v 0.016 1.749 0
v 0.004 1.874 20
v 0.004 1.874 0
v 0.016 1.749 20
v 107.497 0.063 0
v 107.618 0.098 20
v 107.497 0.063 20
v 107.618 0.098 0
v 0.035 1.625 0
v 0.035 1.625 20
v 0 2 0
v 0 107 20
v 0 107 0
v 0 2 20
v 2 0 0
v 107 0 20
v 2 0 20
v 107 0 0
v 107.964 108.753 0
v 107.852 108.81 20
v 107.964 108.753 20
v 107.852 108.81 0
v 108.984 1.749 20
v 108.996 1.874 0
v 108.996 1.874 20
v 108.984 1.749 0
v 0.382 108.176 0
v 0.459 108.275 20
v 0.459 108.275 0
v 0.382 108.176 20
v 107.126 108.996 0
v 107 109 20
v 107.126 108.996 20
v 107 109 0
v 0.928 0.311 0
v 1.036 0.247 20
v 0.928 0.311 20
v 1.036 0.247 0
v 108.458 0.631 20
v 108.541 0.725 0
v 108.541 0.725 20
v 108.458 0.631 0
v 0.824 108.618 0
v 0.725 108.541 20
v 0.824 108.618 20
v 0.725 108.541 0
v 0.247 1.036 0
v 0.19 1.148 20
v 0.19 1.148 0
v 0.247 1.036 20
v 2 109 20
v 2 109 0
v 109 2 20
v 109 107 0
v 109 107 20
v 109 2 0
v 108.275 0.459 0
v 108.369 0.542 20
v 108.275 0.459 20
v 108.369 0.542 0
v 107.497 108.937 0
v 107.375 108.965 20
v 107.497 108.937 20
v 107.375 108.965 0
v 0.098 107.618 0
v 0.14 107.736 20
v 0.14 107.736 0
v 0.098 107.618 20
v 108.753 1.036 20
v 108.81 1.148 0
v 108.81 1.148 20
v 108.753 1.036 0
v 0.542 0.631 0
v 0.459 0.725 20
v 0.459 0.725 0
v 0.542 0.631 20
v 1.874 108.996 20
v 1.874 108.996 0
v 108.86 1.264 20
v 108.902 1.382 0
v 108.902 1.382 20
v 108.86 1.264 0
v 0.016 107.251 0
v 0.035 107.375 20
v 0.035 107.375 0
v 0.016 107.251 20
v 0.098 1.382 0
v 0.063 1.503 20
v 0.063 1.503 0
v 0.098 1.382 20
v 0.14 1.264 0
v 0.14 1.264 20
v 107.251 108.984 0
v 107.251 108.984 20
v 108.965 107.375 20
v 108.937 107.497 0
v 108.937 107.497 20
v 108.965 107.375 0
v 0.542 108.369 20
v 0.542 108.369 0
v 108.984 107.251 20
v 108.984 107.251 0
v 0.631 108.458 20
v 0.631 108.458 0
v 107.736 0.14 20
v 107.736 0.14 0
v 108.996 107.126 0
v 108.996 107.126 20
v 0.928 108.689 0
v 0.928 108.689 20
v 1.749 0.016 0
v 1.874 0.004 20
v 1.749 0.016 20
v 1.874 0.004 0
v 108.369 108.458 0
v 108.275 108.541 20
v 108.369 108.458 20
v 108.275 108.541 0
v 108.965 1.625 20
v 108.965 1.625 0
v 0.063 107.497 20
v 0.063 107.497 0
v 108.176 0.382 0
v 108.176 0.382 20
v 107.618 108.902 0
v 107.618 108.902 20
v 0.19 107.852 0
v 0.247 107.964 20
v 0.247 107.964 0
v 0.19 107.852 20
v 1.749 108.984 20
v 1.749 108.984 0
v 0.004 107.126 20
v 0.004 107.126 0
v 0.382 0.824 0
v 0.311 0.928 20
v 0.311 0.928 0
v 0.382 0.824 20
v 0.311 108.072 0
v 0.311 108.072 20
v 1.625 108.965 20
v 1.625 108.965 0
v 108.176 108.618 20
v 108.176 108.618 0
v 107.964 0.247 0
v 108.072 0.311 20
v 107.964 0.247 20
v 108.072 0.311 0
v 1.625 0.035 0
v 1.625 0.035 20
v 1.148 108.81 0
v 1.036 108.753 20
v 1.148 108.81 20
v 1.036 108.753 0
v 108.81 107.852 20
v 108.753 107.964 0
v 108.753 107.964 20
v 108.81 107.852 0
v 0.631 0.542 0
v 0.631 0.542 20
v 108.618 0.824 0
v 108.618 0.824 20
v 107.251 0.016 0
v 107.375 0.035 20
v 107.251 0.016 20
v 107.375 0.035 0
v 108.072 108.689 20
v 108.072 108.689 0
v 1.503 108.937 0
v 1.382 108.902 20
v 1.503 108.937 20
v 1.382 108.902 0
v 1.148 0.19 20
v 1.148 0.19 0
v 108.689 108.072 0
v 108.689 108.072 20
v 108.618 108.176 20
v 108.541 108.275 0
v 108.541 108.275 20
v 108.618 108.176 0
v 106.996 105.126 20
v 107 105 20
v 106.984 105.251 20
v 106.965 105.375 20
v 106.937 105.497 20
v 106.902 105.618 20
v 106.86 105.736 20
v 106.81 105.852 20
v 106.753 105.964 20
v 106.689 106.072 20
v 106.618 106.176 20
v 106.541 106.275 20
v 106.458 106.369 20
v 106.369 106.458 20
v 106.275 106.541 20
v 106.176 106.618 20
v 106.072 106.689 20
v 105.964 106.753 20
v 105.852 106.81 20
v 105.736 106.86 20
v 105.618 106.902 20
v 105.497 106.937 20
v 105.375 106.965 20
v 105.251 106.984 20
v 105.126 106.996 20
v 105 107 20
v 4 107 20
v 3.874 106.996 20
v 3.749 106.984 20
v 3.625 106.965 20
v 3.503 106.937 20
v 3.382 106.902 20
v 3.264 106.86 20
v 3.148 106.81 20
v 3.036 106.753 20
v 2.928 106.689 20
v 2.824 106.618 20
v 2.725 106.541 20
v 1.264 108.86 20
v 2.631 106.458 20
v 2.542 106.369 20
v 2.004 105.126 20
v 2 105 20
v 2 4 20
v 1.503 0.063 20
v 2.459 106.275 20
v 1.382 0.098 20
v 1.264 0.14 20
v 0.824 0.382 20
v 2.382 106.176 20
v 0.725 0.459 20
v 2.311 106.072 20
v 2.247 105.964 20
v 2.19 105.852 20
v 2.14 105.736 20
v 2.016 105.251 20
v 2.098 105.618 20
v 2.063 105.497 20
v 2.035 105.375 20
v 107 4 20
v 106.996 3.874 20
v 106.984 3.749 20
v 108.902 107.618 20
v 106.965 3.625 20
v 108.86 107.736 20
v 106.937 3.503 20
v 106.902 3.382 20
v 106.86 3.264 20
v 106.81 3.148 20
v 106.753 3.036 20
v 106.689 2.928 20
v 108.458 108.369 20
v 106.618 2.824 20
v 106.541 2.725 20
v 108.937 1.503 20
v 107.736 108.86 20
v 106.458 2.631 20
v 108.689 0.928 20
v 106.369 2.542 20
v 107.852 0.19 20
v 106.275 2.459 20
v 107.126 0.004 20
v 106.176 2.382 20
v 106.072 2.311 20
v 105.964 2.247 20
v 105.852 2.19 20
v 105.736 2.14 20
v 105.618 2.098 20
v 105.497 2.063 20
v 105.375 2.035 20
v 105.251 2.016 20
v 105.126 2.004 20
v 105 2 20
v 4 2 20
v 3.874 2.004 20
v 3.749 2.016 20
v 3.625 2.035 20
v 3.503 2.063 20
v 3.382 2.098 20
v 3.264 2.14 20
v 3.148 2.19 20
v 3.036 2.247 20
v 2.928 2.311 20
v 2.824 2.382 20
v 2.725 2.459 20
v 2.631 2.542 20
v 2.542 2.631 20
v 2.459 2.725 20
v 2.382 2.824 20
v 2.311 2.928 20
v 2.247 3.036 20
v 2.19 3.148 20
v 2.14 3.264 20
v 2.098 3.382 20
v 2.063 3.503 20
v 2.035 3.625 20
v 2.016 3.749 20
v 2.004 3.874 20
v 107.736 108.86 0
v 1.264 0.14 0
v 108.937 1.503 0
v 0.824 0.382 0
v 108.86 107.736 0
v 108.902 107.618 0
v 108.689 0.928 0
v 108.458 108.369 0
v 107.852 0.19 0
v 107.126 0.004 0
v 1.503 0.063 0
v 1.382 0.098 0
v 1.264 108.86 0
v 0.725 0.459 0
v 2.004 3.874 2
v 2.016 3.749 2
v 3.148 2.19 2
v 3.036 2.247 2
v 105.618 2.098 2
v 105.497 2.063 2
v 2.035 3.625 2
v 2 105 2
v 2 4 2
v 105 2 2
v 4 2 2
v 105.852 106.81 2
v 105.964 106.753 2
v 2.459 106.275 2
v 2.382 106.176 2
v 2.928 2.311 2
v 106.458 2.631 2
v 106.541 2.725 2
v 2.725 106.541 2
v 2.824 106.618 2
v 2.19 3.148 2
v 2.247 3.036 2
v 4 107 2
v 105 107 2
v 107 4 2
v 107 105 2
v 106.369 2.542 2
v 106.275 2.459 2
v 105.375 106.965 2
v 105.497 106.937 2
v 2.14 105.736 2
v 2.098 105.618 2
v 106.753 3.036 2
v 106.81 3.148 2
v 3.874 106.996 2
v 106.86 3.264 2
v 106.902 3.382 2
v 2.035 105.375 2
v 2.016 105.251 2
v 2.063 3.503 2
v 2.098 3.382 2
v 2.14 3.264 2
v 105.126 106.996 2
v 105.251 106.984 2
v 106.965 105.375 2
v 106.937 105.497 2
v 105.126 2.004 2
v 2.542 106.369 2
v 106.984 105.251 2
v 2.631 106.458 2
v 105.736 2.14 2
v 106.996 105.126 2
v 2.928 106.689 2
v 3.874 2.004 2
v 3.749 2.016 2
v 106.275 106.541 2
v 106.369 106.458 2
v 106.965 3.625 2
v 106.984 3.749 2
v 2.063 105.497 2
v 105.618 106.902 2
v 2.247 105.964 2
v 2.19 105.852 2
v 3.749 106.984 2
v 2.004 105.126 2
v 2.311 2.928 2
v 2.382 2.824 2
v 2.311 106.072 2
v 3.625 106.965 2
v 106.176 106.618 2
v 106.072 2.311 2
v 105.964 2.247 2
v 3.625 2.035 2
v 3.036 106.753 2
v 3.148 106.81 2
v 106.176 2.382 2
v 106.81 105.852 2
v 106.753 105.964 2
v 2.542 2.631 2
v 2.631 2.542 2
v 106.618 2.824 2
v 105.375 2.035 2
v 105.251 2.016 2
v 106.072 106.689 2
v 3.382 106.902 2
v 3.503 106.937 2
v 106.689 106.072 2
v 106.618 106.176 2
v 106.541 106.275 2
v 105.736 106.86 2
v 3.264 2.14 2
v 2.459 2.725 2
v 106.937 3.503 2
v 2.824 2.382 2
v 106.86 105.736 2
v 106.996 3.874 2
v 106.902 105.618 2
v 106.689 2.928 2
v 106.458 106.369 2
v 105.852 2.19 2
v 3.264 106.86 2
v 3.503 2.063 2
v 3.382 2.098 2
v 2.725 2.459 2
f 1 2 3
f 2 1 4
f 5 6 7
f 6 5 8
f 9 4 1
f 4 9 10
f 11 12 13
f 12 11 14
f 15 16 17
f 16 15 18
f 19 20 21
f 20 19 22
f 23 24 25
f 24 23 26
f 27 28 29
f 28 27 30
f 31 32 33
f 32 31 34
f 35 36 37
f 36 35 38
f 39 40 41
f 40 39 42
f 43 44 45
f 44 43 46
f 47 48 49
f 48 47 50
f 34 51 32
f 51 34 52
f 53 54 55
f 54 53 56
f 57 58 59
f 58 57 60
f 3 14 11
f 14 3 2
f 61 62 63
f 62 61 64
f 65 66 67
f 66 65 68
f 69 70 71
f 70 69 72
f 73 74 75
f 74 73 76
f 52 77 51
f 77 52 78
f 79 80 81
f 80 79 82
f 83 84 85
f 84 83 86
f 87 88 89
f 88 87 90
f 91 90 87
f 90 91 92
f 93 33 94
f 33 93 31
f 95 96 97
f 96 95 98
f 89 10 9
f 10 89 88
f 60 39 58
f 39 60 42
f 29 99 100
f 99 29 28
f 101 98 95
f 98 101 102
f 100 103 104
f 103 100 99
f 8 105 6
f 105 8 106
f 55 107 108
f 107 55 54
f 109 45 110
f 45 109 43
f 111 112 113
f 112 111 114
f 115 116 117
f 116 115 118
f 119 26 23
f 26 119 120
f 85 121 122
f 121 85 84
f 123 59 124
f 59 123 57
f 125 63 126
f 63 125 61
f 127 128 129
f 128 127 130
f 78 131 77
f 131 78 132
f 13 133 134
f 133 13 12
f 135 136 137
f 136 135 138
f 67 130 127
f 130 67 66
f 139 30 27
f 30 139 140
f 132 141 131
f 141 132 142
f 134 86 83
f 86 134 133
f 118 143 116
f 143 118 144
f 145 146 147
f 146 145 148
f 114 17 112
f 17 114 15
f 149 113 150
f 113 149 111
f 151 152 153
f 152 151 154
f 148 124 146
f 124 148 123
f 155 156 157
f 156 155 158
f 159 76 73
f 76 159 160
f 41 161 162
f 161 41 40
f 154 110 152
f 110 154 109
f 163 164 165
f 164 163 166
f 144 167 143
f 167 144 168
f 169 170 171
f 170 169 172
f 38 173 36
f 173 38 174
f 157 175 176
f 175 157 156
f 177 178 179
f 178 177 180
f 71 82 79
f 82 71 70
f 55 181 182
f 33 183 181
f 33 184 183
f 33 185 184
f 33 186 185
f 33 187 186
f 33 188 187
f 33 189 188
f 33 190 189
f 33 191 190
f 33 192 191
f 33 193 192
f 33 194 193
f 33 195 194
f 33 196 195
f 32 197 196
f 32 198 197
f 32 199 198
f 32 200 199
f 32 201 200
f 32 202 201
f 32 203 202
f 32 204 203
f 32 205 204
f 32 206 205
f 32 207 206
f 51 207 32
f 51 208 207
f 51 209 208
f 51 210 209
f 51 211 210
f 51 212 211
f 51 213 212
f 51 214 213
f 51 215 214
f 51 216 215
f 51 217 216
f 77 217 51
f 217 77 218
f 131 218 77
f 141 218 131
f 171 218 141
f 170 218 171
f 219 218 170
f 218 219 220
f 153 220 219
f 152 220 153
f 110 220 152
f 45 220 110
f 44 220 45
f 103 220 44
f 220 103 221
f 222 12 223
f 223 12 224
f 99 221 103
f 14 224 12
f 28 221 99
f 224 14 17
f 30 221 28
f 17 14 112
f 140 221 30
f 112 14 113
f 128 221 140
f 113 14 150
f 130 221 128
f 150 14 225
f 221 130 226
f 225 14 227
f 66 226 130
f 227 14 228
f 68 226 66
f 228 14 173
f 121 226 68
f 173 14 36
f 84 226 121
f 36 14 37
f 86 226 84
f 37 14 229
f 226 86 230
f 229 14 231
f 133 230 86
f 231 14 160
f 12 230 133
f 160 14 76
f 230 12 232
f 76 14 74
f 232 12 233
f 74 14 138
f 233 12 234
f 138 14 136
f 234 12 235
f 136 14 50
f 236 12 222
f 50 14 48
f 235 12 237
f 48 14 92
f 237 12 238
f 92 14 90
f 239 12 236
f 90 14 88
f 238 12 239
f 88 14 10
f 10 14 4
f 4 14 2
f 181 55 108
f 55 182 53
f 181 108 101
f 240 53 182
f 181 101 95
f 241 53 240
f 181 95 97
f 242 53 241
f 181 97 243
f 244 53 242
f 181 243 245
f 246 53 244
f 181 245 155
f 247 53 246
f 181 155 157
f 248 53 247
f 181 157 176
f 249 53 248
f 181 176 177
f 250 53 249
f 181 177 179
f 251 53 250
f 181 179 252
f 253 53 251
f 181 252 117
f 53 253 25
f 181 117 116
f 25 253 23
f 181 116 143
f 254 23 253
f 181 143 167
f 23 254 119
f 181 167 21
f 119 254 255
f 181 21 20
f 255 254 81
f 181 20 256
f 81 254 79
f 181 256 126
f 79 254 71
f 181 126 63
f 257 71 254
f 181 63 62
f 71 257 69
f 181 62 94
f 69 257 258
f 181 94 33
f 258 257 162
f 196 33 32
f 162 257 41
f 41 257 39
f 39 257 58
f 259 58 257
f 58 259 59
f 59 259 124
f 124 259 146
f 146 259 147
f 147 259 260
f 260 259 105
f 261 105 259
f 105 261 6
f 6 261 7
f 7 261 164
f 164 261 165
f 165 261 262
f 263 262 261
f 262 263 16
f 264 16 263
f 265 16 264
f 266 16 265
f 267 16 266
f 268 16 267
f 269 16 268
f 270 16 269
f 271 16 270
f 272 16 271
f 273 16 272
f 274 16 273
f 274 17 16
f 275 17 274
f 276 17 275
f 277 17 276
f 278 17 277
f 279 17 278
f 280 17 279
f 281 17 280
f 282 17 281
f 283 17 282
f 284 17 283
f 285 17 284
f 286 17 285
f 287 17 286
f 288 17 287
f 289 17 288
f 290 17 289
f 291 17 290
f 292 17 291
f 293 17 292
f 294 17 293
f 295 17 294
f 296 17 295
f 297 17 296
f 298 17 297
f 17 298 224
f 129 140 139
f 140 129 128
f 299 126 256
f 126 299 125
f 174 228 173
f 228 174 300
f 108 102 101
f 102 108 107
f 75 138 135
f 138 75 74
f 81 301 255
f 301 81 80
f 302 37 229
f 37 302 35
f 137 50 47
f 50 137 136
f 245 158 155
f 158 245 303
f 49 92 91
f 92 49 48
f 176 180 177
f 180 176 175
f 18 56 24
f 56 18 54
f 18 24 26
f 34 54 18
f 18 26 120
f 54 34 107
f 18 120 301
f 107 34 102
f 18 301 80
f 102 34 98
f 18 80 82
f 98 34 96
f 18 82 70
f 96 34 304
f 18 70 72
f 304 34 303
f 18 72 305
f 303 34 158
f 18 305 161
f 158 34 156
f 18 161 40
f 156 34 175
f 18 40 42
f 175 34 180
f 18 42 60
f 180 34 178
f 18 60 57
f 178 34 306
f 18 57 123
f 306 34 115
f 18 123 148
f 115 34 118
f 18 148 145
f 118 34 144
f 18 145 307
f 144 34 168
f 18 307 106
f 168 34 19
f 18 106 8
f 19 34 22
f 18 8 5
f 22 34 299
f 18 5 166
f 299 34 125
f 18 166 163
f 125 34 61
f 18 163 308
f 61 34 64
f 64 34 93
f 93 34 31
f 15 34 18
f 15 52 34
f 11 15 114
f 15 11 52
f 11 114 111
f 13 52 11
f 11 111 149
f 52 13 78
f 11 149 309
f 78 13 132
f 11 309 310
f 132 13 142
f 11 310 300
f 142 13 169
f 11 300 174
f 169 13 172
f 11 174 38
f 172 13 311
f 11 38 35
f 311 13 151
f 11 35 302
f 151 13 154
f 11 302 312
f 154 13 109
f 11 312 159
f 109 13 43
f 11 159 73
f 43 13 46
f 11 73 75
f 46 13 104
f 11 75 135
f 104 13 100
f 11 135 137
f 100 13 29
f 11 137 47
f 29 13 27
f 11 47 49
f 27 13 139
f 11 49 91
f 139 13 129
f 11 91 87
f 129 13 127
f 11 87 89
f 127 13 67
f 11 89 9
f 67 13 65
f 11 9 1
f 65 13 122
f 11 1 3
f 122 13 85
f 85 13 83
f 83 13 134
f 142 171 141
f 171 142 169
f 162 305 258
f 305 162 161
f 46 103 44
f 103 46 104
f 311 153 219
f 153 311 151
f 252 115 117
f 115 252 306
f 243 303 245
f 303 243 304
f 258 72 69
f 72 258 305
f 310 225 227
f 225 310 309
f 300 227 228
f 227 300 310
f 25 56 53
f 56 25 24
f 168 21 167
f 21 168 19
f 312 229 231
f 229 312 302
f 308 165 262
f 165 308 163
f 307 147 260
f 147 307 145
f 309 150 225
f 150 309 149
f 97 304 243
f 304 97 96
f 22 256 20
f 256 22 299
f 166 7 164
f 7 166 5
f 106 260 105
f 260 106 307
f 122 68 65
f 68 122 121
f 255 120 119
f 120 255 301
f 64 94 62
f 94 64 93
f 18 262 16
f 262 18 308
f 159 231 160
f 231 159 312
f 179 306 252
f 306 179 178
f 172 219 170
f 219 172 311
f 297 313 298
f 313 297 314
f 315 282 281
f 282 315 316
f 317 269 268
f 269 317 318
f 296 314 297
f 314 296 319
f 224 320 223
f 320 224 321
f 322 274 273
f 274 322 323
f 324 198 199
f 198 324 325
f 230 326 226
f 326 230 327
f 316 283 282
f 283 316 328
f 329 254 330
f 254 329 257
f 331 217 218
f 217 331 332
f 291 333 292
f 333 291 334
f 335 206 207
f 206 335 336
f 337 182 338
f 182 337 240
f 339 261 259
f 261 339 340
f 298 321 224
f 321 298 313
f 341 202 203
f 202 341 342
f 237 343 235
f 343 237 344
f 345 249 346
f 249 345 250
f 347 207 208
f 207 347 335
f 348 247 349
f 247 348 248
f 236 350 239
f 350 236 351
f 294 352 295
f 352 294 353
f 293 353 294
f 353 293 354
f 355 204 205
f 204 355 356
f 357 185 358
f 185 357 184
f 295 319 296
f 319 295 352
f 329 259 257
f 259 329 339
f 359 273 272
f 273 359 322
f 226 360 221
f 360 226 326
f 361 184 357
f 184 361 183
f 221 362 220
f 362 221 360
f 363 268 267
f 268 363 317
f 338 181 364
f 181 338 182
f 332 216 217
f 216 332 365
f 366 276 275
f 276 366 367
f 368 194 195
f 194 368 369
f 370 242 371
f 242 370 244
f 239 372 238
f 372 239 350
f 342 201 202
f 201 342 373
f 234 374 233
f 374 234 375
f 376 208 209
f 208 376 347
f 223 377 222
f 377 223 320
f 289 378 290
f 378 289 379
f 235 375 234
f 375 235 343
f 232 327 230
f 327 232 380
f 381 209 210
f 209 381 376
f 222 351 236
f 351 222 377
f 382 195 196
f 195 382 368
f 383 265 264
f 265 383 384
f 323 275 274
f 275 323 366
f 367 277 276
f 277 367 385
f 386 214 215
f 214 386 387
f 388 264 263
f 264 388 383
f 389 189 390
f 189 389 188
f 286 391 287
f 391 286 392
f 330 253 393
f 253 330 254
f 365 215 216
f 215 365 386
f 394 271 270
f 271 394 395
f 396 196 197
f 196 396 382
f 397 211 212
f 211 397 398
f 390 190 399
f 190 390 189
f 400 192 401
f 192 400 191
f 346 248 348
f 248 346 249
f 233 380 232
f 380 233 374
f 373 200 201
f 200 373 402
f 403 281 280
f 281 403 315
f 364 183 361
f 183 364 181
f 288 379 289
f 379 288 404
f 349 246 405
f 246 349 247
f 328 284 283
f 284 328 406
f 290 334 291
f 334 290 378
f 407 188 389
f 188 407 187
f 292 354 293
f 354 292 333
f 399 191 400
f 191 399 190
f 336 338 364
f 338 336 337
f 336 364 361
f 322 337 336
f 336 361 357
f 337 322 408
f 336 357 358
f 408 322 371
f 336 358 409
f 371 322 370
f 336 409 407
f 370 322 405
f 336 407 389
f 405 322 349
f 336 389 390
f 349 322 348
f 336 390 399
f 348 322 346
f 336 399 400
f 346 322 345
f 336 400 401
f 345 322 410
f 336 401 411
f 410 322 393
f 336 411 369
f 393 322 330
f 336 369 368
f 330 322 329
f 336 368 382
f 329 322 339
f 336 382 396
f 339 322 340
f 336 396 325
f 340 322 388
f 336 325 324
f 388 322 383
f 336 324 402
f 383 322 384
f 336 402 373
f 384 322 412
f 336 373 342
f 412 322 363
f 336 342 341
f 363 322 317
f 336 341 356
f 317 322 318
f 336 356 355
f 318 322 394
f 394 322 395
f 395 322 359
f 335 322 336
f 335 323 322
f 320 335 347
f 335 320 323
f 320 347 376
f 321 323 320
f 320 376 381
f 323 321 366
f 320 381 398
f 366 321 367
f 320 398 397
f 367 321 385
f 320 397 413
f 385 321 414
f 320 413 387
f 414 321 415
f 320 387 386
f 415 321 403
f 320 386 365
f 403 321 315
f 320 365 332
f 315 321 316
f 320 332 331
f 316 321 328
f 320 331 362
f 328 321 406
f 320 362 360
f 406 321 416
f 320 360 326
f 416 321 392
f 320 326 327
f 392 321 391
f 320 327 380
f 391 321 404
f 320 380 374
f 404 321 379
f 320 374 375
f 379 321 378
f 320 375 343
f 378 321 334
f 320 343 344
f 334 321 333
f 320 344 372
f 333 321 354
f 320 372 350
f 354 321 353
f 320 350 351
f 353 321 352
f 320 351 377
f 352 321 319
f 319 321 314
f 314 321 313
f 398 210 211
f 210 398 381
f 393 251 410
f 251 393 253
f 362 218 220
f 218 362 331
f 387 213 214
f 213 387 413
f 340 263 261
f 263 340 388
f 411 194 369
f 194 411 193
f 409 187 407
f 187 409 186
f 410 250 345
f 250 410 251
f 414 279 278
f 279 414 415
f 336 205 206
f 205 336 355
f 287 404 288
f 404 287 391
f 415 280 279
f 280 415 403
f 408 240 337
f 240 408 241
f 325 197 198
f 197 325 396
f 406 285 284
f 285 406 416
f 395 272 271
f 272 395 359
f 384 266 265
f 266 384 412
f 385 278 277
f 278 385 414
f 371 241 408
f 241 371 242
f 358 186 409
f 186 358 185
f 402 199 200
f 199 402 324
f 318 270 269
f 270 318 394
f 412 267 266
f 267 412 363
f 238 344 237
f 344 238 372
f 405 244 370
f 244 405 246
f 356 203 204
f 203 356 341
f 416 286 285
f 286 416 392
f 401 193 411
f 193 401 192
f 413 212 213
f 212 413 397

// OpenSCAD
// file: template.scad
module _rounded_box(dim, r)
{
  //%cube(dim);
  hull()
  {
    for(dx=[r, dim[0]-r])
      for(dy=[r, dim[1]-r])
        translate([dx, dy, 0])
          cylinder(r=r, h=dim[2], $fn=100);
  }
}


module minibox(dim, r, wall)
{
  difference()
  {
    _rounded_box(dim, r);
    translate(wall*[1,1,1])
      _rounded_box(dim-2*wall*[1,1,0], r);
  }
}


minibox([30, 20, 10], 2, 2);
// main file
use <template.scad>

wall=2;
minibox((105+2*wall)*[1,1,0]+[0,0,20], r=2, wall=wall);
